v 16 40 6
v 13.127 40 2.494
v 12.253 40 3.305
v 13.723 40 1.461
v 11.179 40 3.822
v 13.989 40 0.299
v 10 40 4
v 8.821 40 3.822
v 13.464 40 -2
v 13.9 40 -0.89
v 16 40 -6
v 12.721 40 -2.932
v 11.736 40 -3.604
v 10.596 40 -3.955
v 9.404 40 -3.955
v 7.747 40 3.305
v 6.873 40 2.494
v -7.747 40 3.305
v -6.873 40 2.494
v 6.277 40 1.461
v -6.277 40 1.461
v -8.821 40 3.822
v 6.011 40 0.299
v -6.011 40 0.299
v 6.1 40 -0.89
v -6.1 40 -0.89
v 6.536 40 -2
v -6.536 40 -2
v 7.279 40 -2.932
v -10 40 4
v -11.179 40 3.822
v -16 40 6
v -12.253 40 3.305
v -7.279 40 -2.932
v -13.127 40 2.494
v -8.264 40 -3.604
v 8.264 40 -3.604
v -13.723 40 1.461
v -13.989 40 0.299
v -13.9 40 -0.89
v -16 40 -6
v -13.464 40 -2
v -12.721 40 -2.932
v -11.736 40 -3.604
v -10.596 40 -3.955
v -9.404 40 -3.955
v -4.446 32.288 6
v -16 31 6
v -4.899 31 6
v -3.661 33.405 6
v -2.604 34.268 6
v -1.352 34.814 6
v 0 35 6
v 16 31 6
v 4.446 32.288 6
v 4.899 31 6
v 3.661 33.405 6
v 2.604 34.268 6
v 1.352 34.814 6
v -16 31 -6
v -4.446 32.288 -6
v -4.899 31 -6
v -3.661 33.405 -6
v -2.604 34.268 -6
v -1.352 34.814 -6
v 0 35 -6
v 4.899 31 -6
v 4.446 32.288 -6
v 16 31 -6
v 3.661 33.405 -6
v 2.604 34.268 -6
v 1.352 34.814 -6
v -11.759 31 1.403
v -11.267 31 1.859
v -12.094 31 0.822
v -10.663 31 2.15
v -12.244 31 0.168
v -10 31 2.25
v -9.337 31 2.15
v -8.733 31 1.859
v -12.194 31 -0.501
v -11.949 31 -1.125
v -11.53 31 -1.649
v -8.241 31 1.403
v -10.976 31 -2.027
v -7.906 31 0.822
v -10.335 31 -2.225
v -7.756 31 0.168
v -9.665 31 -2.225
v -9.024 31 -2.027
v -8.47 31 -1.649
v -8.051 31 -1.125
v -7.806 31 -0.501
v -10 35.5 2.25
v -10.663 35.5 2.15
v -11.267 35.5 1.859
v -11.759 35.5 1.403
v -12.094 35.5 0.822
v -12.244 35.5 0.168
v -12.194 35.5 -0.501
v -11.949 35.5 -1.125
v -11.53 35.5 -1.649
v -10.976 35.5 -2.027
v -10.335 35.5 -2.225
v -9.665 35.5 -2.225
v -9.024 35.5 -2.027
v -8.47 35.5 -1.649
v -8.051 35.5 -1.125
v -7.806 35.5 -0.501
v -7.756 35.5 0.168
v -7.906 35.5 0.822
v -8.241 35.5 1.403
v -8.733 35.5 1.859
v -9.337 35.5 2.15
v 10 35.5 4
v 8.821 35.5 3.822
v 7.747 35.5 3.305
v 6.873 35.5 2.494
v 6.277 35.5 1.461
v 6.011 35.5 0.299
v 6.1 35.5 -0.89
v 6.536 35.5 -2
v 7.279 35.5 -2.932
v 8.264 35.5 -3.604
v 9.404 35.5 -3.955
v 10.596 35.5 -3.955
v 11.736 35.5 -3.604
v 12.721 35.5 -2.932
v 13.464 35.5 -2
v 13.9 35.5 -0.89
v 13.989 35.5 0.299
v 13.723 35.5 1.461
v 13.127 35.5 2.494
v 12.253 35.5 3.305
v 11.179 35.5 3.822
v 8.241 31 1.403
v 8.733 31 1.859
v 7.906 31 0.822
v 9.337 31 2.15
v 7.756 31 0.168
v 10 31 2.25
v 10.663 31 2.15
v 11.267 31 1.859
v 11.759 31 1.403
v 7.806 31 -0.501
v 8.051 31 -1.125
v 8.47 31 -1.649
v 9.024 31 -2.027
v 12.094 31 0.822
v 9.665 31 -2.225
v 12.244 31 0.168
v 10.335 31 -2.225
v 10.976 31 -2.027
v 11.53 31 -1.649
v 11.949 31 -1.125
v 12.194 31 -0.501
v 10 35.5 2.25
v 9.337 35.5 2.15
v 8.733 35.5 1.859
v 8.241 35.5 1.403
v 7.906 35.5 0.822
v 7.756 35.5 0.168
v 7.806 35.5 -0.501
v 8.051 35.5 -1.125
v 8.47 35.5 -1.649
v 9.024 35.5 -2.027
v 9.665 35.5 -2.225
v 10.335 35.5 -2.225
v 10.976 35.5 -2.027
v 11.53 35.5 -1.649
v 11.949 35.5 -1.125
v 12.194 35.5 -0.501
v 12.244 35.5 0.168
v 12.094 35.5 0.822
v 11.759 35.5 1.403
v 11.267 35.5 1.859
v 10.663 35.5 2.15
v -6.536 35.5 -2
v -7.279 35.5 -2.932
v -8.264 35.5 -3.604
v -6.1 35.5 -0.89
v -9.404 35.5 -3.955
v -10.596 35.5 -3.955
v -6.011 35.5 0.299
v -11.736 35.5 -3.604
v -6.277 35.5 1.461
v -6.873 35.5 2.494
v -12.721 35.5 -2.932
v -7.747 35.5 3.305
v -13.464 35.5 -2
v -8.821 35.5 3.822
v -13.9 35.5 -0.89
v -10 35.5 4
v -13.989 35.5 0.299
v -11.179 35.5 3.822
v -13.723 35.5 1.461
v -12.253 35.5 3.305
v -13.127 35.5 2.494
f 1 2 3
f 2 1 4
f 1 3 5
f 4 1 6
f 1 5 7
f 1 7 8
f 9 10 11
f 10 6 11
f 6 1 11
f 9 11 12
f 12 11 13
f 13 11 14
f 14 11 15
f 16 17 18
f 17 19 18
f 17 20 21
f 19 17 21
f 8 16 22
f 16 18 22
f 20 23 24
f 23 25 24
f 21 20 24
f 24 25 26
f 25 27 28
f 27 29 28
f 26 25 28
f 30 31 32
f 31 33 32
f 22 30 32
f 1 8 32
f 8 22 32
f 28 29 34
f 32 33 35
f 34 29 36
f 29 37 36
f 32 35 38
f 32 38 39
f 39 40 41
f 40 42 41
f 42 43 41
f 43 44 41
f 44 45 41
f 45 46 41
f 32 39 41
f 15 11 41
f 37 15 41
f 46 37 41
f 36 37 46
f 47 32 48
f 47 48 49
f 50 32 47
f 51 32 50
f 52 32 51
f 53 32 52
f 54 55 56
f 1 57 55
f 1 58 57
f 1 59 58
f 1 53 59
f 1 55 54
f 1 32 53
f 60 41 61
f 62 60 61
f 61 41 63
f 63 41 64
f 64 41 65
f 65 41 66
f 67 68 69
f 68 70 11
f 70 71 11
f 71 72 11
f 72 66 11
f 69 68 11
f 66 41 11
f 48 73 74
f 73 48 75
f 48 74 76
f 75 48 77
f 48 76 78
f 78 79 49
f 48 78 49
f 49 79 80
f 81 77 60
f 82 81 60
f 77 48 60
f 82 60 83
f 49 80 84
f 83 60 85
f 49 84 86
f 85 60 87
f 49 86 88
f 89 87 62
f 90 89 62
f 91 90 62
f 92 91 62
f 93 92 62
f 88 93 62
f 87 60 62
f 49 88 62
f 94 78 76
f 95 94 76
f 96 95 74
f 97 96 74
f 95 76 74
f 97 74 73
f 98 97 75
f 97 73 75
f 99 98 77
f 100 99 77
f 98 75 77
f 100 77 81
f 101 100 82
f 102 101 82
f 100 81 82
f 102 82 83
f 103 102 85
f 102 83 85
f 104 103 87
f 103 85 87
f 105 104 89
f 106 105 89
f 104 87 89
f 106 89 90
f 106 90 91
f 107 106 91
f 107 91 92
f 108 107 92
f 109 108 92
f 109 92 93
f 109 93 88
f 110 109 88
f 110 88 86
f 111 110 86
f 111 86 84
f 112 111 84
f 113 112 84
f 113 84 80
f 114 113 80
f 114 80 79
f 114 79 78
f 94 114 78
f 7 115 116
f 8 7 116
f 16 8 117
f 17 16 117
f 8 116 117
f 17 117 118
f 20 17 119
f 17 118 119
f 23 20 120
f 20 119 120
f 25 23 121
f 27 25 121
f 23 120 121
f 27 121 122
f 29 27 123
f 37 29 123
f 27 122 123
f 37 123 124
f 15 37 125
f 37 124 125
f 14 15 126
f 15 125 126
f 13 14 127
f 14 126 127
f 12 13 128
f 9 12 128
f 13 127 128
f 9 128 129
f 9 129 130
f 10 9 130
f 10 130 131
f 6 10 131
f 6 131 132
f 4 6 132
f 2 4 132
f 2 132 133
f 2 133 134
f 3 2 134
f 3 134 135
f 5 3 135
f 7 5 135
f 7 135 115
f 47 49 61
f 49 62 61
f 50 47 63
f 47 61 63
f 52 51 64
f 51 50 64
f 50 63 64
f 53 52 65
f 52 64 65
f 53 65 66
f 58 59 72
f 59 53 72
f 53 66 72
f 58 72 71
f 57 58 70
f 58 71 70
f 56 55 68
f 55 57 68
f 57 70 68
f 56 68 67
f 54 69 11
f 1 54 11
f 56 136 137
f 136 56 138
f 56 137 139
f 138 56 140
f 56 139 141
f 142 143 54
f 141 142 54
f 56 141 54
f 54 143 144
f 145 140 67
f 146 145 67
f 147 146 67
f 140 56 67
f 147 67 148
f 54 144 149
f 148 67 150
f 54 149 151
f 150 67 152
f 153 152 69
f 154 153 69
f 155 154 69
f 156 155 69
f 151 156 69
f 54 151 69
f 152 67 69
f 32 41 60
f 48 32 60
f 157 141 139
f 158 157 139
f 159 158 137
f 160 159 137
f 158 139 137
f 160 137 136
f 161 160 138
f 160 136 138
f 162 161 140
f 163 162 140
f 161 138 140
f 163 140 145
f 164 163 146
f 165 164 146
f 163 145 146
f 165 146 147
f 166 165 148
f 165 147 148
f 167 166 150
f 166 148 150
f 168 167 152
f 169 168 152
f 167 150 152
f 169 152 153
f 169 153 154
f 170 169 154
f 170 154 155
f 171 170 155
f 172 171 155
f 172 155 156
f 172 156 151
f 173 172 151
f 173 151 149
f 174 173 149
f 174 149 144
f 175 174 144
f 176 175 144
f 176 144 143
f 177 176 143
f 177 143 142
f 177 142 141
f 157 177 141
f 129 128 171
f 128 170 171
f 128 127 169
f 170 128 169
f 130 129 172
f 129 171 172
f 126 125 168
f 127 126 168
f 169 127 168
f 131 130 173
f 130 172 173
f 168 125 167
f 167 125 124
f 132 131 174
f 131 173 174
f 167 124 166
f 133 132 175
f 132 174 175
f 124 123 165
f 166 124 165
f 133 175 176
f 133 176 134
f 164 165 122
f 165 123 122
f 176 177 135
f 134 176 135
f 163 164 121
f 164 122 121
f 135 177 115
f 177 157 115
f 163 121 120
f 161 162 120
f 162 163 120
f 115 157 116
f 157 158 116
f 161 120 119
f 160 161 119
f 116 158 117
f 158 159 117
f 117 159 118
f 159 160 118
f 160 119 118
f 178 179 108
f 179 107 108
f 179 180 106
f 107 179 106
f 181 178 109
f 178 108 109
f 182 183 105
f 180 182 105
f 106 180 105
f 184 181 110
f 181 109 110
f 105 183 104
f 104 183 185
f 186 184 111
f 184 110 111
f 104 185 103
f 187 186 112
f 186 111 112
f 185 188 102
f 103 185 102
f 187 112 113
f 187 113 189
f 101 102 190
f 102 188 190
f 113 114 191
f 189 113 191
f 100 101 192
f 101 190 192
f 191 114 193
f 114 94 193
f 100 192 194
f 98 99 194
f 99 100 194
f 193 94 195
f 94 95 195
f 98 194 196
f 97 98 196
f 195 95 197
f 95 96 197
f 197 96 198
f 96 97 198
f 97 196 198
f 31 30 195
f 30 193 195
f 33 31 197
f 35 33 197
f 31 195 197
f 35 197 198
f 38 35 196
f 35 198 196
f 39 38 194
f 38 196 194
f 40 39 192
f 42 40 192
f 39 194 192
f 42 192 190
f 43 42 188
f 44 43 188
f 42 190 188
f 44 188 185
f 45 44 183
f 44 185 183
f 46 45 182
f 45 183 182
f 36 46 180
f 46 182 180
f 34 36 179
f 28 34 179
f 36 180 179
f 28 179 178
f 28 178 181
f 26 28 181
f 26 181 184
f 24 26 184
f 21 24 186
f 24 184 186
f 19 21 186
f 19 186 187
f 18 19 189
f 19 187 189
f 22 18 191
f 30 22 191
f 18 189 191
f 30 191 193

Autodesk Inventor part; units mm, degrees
sketch "Sketch_10" plane through (0, 0, 0) normal (0, 0, 1) x (1, 0, 0)
  line L0 (-16, 40) -> (-16, 31)
  line L1 (-16, 31) -> (-4.899, 31)
  arc A0 (4.899, 31) -> (-4.899, 31) centre (0, 30) ccw
  line L2 (4.899, 31) -> (16, 31)
  line L3 (16, 31) -> (16, 40)
  line L4 (16, 40) -> (-16, 40)
extrude "Extrusion1" add sketch "Sketch_10" along normal mid plane 12
sketch "Sketch2" plane through (-16, 40, 6) normal (0, 1, 0) x (1, 0, 0)
  point P0 (26, 6)
hole "Hole1" at (10, 40, 0) direction (0, -1, 0) diameter 4.5 depth 9 counterbore diameter 8 counterbore depth 4.5
sketch "Sketch3" plane through (-16, 40, 6) normal (0, 1, 0) x (1, 0, 0)
  point P0 (6, 6)
hole "Hole2" at (-10, 40, 0) direction (0, -1, 0) diameter 4.5 depth 9 counterbore diameter 8 counterbore depth 4.5
ref_plane "p_to_b_XY" through (0, 0, 0) normal (0, 1, 0) x (1, 0, 0)
ref_plane "p_to_b_YZ" through (0, 0, 0) normal (1, 0, 0) x (0, 0, -1)
ref_plane "p_to_b_ZX" through (0, 0, 0) normal (0, 0, -1) x (0, 1, 0)
properties part number "SHZA10-30_p"
